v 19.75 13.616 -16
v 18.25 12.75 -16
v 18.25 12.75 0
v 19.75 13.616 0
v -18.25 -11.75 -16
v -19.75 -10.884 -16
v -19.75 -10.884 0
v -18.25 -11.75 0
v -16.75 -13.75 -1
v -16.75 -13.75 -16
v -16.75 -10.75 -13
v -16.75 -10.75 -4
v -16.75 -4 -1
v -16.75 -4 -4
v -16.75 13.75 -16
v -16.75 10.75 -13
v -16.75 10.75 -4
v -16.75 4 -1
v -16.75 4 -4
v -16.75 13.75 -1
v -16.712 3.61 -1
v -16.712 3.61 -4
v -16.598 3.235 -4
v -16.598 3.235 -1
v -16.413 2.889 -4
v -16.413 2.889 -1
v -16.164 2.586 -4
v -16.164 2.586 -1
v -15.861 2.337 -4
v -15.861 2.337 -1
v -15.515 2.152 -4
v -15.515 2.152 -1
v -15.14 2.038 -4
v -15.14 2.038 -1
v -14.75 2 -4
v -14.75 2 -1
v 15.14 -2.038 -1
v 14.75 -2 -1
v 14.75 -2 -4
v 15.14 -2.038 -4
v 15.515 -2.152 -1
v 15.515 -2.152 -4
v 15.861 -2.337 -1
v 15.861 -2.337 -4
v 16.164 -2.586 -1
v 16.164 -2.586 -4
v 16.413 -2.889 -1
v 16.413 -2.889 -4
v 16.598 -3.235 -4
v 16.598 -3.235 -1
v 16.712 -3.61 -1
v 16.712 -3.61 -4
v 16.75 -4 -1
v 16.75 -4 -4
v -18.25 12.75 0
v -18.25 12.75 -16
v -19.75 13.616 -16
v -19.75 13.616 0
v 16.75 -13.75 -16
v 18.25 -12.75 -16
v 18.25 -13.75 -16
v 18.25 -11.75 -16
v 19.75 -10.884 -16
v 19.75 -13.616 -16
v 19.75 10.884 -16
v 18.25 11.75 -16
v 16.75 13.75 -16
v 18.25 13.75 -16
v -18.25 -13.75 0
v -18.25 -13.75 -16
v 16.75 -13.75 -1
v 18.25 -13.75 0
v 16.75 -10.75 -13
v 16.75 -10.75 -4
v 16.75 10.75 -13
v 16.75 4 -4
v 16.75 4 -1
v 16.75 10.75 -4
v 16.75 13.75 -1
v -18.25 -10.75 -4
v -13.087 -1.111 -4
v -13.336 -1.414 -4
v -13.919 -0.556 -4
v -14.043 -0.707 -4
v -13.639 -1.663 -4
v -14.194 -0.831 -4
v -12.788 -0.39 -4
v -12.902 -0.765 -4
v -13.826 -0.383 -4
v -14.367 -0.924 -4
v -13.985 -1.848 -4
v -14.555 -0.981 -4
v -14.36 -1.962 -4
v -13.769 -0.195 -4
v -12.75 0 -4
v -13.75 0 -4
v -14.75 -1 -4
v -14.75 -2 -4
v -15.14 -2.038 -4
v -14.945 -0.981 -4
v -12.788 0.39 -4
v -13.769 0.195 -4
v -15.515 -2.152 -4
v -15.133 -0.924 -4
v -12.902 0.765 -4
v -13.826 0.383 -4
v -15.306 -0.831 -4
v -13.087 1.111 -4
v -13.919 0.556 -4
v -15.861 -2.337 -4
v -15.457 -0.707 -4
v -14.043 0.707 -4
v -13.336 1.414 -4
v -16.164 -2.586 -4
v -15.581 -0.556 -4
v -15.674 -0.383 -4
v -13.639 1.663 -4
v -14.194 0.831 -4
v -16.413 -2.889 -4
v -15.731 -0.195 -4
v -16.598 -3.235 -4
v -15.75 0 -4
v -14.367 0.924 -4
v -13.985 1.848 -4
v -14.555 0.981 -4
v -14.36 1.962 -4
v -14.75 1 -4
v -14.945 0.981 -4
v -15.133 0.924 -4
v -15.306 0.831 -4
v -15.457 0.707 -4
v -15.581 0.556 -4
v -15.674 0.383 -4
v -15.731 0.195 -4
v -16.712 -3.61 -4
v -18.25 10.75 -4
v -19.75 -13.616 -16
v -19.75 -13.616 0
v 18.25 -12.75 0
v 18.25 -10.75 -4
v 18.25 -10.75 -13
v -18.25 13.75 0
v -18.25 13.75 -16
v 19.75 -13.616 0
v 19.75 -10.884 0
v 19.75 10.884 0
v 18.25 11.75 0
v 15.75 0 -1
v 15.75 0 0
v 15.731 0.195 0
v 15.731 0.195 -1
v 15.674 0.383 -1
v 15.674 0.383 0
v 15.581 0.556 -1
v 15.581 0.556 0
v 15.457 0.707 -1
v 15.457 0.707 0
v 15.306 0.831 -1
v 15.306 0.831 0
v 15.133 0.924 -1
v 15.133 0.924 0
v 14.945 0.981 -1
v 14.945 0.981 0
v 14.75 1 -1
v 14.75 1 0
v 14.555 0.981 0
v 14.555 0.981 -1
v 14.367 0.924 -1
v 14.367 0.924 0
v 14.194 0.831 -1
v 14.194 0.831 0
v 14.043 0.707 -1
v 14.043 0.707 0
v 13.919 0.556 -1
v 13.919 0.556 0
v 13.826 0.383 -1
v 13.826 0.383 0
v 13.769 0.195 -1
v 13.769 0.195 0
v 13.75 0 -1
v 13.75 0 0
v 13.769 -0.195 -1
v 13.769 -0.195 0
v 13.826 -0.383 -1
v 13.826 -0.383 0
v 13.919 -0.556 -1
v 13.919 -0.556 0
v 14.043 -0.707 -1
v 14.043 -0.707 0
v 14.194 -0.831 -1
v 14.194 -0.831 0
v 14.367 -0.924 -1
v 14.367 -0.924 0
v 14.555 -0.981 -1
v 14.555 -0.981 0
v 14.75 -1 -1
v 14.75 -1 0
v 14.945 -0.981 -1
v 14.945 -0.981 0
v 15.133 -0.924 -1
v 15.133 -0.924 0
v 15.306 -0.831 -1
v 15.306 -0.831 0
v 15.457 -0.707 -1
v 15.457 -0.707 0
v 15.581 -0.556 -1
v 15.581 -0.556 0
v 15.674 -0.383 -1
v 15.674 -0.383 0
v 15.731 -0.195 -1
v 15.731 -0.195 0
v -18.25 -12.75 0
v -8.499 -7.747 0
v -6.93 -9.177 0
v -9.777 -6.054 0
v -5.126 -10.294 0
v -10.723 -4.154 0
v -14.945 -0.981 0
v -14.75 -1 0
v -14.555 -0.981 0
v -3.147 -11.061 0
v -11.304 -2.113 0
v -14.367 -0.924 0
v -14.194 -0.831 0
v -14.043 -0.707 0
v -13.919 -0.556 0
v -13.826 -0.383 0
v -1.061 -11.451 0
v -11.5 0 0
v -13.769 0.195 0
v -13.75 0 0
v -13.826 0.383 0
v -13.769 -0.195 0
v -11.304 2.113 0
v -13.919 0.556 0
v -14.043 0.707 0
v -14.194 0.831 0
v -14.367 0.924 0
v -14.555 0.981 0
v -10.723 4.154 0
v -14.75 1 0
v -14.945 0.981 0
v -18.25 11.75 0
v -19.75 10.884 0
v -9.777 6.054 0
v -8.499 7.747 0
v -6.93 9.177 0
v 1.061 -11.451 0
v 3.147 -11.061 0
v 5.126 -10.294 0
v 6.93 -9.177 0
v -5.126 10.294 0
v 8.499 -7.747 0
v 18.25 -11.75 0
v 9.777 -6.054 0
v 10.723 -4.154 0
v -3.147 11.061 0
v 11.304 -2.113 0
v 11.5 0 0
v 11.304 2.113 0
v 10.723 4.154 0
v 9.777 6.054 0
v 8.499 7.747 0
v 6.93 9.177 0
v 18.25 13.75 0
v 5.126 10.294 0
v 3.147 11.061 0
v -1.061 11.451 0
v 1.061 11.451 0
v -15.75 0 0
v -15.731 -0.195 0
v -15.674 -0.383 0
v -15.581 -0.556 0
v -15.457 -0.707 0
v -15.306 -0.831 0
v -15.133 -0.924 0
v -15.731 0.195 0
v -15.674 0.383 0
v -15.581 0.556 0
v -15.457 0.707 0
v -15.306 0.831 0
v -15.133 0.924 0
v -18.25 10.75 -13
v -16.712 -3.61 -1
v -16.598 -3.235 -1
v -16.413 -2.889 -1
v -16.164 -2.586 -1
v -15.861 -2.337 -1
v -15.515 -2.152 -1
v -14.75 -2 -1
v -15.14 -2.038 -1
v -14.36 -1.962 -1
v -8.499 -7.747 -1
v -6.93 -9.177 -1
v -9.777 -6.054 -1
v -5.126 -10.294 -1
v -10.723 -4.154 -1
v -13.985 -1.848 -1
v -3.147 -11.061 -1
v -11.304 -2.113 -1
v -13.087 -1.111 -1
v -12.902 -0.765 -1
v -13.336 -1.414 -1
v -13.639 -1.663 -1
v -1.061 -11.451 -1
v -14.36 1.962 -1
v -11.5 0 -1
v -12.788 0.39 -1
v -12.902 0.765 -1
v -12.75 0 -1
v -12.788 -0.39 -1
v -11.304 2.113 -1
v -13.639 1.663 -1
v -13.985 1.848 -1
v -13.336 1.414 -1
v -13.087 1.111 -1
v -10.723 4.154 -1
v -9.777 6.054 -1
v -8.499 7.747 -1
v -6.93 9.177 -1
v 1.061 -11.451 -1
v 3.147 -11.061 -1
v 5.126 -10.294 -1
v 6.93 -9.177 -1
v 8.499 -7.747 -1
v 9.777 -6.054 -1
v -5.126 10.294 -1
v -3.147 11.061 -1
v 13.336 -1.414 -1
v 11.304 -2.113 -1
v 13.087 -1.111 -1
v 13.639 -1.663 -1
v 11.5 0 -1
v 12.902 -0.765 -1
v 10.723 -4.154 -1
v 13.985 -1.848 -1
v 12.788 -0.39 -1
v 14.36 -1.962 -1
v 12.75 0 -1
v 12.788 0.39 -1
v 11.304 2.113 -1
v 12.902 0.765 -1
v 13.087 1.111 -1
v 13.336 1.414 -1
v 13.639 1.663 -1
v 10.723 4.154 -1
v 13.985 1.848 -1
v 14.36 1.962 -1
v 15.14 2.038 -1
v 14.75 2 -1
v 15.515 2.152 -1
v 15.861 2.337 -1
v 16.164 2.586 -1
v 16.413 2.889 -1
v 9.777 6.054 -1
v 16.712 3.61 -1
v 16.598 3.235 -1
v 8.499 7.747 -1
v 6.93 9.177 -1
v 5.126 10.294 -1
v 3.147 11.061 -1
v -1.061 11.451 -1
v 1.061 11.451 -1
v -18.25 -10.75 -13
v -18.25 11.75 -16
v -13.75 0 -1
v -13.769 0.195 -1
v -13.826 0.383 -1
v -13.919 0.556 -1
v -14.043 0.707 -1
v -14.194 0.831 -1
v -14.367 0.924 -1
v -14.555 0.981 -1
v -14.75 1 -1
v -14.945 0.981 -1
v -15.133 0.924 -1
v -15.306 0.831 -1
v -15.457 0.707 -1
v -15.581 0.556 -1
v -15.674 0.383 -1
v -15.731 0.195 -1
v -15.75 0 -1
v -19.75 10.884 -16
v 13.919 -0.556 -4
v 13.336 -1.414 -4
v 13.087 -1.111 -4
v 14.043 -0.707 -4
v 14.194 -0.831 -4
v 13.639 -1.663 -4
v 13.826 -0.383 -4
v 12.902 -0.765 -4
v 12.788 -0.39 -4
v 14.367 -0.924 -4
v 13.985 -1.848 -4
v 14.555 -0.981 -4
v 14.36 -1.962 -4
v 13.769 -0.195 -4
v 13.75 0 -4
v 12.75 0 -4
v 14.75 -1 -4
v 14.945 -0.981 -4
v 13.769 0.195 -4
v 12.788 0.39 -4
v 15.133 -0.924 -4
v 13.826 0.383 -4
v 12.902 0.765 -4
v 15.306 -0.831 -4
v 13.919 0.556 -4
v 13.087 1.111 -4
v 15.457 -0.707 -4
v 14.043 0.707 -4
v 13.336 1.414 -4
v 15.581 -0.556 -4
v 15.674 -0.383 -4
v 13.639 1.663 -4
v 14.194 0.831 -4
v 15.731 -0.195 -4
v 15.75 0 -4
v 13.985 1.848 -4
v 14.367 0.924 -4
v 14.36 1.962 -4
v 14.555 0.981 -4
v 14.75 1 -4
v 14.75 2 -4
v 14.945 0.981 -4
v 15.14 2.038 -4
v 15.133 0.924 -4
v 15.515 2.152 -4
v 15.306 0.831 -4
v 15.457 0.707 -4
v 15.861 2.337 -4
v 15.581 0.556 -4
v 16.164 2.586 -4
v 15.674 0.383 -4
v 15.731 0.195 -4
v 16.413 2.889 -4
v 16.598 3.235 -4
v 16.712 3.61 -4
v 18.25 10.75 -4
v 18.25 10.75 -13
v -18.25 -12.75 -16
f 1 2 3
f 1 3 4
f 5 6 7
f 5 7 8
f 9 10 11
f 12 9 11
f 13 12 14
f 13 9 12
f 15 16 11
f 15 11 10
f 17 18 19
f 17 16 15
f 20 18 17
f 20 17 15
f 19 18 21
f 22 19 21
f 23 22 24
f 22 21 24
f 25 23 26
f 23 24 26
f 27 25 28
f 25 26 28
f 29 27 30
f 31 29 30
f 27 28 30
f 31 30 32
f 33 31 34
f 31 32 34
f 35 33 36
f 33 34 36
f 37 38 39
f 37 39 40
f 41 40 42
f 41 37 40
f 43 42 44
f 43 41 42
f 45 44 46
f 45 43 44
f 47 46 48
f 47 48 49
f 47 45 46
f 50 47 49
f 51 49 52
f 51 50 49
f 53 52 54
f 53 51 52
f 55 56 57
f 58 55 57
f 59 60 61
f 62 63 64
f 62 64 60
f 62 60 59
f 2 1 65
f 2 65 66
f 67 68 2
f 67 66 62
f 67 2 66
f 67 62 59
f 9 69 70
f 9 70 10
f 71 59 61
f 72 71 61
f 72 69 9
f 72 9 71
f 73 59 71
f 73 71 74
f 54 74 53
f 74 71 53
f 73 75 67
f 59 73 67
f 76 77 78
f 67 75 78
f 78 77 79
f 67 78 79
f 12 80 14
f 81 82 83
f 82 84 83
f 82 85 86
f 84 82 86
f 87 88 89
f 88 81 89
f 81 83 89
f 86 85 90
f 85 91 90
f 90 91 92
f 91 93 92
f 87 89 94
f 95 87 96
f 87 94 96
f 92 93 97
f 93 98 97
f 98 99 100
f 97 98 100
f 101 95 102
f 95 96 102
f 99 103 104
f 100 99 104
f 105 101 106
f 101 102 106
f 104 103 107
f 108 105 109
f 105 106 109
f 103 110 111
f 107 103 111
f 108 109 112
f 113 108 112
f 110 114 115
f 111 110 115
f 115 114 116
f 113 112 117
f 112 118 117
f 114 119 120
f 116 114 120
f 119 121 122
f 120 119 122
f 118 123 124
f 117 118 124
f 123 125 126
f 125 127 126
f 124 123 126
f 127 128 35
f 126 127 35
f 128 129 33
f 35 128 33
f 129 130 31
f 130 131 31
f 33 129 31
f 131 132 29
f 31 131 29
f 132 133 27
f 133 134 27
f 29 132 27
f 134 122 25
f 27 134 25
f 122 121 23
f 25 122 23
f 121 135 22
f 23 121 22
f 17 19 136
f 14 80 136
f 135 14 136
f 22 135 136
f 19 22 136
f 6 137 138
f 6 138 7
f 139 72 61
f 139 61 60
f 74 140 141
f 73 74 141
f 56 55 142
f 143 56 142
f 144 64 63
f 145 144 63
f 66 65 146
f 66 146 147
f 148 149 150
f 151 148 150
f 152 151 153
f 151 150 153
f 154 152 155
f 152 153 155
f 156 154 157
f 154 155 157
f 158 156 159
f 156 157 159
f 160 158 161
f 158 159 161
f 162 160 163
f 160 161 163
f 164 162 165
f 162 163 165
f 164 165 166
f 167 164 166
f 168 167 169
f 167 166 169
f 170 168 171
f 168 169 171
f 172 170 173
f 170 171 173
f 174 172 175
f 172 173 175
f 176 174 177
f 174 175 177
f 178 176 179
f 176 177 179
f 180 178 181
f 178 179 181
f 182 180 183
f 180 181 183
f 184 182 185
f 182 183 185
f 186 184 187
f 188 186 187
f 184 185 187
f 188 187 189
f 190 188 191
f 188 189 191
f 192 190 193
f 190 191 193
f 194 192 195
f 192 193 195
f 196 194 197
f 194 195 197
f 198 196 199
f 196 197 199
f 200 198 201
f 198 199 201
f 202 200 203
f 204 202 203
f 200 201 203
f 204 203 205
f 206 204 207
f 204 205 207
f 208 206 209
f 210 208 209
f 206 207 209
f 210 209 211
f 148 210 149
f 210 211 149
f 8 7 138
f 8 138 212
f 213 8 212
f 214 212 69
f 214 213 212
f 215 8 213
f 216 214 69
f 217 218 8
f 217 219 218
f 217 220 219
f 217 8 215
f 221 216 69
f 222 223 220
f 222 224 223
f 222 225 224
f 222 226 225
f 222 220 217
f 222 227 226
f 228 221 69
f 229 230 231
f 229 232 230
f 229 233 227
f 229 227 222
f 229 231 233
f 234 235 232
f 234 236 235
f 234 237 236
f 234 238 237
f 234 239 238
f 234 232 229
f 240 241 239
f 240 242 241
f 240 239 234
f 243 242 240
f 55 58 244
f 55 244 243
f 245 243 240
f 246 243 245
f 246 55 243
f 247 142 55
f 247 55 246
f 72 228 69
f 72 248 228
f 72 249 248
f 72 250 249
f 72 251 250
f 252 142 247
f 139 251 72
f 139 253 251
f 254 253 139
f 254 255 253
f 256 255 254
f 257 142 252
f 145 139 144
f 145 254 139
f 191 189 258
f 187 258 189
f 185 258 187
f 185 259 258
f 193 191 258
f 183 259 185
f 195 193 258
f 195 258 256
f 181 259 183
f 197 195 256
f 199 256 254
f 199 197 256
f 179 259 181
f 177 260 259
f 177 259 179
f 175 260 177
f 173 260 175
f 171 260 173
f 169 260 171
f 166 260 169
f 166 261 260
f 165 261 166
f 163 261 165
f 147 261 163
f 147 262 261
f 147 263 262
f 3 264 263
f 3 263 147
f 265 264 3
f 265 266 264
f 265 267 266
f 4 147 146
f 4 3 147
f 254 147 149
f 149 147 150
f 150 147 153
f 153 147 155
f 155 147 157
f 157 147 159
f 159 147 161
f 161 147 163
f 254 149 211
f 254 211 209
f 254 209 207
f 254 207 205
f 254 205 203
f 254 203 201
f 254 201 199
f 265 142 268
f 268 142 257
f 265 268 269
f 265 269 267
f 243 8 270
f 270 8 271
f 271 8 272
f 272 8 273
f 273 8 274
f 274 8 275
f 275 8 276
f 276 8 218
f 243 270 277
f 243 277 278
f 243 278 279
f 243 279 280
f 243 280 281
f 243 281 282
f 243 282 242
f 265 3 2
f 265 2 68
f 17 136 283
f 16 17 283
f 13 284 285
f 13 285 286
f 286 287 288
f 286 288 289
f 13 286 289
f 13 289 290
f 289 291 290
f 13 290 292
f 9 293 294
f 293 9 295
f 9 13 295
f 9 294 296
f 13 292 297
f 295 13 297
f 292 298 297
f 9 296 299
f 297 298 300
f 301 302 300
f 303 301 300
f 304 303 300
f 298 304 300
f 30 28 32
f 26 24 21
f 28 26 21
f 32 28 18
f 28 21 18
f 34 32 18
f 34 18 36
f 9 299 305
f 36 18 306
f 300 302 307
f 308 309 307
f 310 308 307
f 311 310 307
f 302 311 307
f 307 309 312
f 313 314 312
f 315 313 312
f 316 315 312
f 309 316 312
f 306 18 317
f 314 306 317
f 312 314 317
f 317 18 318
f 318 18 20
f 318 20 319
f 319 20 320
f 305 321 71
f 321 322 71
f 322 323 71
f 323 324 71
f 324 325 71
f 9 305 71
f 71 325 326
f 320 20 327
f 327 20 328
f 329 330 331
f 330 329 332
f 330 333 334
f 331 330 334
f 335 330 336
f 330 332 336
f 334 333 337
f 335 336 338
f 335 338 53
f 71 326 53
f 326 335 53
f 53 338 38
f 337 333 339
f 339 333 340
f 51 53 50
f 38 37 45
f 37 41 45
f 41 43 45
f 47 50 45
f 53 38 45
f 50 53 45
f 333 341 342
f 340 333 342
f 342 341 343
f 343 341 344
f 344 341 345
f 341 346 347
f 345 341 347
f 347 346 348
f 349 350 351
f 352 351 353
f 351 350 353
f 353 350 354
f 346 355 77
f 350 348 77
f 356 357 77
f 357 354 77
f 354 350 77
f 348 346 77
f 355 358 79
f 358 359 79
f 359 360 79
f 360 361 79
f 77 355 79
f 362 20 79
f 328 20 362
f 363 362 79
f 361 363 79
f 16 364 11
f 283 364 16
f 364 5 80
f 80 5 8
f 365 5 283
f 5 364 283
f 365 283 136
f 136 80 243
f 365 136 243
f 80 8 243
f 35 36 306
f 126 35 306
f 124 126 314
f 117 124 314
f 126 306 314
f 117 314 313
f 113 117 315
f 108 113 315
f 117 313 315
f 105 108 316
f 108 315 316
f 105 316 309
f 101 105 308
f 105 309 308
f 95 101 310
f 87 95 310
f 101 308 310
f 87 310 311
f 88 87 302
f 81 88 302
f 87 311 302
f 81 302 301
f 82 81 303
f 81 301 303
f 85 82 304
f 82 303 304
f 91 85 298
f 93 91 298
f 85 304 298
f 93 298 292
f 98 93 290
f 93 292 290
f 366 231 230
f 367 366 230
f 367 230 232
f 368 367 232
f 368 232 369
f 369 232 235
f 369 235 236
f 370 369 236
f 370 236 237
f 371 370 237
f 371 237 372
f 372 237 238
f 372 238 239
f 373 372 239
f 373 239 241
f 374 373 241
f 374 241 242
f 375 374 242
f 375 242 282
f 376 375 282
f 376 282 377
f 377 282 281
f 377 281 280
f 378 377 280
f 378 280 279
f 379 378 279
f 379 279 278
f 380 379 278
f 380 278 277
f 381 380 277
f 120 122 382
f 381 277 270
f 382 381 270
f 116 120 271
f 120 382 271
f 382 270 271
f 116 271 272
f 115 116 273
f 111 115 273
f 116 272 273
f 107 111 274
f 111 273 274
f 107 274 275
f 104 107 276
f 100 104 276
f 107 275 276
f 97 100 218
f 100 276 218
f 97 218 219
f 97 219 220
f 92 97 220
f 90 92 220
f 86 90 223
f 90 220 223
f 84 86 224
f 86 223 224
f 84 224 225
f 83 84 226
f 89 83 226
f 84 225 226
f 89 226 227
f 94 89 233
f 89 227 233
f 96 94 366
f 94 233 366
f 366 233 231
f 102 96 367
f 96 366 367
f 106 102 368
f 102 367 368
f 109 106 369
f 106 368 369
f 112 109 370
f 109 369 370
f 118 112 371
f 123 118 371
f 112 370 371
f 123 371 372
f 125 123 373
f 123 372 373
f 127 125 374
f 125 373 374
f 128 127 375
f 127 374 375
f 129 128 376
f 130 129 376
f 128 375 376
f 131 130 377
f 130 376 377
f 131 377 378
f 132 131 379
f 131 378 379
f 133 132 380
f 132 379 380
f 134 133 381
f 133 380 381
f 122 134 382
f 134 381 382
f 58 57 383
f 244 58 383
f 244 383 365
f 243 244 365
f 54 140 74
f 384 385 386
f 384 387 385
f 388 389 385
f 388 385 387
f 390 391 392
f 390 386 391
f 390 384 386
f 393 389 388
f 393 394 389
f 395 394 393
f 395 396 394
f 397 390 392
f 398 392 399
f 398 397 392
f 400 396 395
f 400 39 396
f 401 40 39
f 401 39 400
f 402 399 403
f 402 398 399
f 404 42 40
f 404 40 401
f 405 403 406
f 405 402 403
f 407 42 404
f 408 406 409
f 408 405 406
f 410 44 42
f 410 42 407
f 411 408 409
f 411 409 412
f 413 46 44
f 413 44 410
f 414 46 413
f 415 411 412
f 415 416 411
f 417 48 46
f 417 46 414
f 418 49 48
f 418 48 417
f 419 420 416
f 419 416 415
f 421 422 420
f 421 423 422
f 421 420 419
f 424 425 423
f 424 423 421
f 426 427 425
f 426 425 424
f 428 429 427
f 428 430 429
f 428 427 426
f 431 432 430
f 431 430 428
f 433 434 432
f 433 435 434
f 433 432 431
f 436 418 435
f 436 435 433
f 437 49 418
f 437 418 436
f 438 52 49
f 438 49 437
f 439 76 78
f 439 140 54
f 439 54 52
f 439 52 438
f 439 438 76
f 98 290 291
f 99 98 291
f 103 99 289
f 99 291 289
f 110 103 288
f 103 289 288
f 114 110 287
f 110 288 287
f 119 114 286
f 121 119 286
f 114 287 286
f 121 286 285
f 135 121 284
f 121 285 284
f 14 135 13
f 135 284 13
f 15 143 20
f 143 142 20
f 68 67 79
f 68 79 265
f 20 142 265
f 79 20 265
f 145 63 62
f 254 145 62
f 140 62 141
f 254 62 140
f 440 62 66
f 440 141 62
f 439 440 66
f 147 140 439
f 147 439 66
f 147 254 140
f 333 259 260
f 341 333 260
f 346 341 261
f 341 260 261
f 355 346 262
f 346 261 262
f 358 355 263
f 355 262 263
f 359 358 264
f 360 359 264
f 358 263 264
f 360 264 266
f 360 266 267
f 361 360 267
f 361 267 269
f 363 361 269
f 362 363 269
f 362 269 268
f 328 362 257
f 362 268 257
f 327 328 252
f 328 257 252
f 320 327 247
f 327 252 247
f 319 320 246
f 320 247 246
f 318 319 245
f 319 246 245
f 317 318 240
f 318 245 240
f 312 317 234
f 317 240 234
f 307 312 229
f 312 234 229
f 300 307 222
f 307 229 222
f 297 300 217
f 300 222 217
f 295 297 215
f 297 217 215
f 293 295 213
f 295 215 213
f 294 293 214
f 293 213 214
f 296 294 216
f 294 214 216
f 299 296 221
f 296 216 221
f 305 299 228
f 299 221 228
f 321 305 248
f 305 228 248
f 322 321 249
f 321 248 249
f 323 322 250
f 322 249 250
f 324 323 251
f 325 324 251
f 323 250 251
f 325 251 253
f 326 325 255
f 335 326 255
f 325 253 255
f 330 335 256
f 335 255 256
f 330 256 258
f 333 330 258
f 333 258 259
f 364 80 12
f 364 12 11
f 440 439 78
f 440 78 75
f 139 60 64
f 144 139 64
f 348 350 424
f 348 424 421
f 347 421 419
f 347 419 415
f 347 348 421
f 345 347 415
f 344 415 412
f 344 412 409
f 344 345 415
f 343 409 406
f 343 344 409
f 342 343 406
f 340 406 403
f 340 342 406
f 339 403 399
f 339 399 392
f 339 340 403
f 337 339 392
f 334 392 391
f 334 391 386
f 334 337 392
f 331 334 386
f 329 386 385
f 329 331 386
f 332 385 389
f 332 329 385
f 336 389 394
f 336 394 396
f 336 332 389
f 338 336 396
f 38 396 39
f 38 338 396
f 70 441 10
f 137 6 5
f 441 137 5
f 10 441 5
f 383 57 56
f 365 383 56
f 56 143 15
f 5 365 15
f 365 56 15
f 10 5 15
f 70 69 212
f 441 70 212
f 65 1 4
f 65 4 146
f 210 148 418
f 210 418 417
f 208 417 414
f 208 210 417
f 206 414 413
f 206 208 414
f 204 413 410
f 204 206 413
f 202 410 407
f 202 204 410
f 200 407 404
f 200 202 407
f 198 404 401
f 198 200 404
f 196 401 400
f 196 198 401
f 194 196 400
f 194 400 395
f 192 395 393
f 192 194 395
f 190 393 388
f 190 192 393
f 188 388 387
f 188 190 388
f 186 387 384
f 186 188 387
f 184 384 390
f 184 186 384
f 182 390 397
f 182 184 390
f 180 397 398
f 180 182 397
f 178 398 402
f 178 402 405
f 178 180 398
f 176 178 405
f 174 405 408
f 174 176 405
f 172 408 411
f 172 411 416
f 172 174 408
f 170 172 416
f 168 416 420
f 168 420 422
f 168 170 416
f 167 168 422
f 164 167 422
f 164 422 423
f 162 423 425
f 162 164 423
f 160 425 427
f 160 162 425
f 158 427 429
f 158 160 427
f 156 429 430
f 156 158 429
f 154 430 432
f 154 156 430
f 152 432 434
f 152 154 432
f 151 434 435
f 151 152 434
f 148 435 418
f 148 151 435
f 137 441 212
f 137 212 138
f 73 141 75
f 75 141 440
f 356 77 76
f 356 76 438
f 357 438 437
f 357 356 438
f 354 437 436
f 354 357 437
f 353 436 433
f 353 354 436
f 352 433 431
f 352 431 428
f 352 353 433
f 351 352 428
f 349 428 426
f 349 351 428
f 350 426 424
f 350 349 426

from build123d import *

# Parameters (mm, degrees)
SKETCH2_W           = 36.5
SKETCH2_H           = 27.5
SKETCH2_R           = 11.5
SKETCH2_R_2         = 1
BOSS_EXTRUDE1_DEPTH = 1
SKETCH4_R           = 1
BOSS_EXTRUDE2_DEPTH = 3
SKETCH5_W           = 1.5
SKETCH5_H           = 27.5
BOSS_EXTRUDE3_DEPTH = 12
SKETCH6_W           = 9
SKETCH6_H           = 21.5
CUT_EXTRUDE1_DEPTH  = 1.5
BOSS_EXTRUDE4_DEPTH = 16


with BuildPart() as part:
    # Sketch2 → Boss-Extrude1 (new body)
    with BuildSketch(Plane.XY):
        Rectangle(SKETCH2_W, SKETCH2_H)
        Circle(SKETCH2_R, mode=Mode.SUBTRACT)
        with Locations((-14.75, 0)):
            Circle(SKETCH2_R_2, mode=Mode.SUBTRACT)
        with Locations((14.75, 0)):
            Circle(SKETCH2_R_2, mode=Mode.SUBTRACT)
    extrude(amount=-BOSS_EXTRUDE1_DEPTH)

    # Sketch4 → Boss-Extrude2 (add)
    with BuildSketch(Plane(origin=(0, 0, -1), x_dir=(-1, 0, 0), z_dir=(0, 0, -1))):
        with BuildLine():
            Line((-16.75, 13.75), (-16.75, 4))
            ThreePointArc((-16.75, 4), (-16.164213562, 2.585786438), (-14.75, 2))
            ThreePointArc((-14.75, 2), (-12.75, 0), (-14.75, -2))
            ThreePointArc((-14.75, -2), (-16.164213562, -2.585786438), (-16.75, -4))
            Line((-16.75, -4), (-16.75, -13.75))
            Line((-16.75, -13.75), (-18.25, -13.75))
            Line((-18.25, -13.75), (-18.25, 13.75))
            Line((-18.25, 13.75), (-16.75, 13.75))
        make_face()
        with Locations(Location((-14.75, 0, 0), (0, 0, 180))):
            Circle(SKETCH4_R, mode=Mode.SUBTRACT)
    boss_extrude2 = extrude(amount=BOSS_EXTRUDE2_DEPTH)

    # Sketch5 → Boss-Extrude3 (add)
    with BuildSketch(Plane(origin=(0, 0, -4), x_dir=(-1, 0, 0), z_dir=(0, 0, -1))):
        with Locations((-17.5, 0)):
            Rectangle(SKETCH5_W, SKETCH5_H)
    boss_extrude3 = extrude(amount=BOSS_EXTRUDE3_DEPTH)

    # Sketch6 → Cut-Extrude1 (cut)
    with BuildSketch(Plane(origin=(18.25, 0, 0), x_dir=(0, 0, -1), z_dir=(1, 0, 0))):
        with Locations((8.5, 0)):
            Rectangle(SKETCH6_W, SKETCH6_H)
    cut_extrude1 = extrude(amount=-CUT_EXTRUDE1_DEPTH, mode=Mode.SUBTRACT)

    # Sketch7 → Boss-Extrude4 (add)
    with BuildSketch(Plane(origin=(0, 0, -16), x_dir=(-1, 0, 0), z_dir=(0, 0, -1))):
        Polygon((-18.25, 12.75), (-19.75, 13.616025404), (-19.75, 10.883974596), (-18.25, 11.75), align=None)
        Polygon((-19.75, -10.883974596), (-18.25, -11.75), (-18.25, -12.75), (-19.75, -13.616025404), align=None)
    boss_extrude4 = extrude(amount=-BOSS_EXTRUDE4_DEPTH)

    # Mirror1: Boss-Extrude2, Boss-Extrude3, Cut-Extrude1, Boss-Extrude4 across plane
    add(boss_extrude2.mirror(Plane(origin=(0, 0, 0), x_dir=(0, 0, 1), z_dir=(1, 0, 0))))
    add(boss_extrude3.mirror(Plane(origin=(0, 0, 0), x_dir=(0, 0, 1), z_dir=(1, 0, 0))))
    add(cut_extrude1.mirror(Plane(origin=(0, 0, 0), x_dir=(0, 0, 1), z_dir=(1, 0, 0))), mode=Mode.SUBTRACT)
    add(boss_extrude4.mirror(Plane(origin=(0, 0, 0), x_dir=(0, 0, 1), z_dir=(1, 0, 0))))


solid = part.part
